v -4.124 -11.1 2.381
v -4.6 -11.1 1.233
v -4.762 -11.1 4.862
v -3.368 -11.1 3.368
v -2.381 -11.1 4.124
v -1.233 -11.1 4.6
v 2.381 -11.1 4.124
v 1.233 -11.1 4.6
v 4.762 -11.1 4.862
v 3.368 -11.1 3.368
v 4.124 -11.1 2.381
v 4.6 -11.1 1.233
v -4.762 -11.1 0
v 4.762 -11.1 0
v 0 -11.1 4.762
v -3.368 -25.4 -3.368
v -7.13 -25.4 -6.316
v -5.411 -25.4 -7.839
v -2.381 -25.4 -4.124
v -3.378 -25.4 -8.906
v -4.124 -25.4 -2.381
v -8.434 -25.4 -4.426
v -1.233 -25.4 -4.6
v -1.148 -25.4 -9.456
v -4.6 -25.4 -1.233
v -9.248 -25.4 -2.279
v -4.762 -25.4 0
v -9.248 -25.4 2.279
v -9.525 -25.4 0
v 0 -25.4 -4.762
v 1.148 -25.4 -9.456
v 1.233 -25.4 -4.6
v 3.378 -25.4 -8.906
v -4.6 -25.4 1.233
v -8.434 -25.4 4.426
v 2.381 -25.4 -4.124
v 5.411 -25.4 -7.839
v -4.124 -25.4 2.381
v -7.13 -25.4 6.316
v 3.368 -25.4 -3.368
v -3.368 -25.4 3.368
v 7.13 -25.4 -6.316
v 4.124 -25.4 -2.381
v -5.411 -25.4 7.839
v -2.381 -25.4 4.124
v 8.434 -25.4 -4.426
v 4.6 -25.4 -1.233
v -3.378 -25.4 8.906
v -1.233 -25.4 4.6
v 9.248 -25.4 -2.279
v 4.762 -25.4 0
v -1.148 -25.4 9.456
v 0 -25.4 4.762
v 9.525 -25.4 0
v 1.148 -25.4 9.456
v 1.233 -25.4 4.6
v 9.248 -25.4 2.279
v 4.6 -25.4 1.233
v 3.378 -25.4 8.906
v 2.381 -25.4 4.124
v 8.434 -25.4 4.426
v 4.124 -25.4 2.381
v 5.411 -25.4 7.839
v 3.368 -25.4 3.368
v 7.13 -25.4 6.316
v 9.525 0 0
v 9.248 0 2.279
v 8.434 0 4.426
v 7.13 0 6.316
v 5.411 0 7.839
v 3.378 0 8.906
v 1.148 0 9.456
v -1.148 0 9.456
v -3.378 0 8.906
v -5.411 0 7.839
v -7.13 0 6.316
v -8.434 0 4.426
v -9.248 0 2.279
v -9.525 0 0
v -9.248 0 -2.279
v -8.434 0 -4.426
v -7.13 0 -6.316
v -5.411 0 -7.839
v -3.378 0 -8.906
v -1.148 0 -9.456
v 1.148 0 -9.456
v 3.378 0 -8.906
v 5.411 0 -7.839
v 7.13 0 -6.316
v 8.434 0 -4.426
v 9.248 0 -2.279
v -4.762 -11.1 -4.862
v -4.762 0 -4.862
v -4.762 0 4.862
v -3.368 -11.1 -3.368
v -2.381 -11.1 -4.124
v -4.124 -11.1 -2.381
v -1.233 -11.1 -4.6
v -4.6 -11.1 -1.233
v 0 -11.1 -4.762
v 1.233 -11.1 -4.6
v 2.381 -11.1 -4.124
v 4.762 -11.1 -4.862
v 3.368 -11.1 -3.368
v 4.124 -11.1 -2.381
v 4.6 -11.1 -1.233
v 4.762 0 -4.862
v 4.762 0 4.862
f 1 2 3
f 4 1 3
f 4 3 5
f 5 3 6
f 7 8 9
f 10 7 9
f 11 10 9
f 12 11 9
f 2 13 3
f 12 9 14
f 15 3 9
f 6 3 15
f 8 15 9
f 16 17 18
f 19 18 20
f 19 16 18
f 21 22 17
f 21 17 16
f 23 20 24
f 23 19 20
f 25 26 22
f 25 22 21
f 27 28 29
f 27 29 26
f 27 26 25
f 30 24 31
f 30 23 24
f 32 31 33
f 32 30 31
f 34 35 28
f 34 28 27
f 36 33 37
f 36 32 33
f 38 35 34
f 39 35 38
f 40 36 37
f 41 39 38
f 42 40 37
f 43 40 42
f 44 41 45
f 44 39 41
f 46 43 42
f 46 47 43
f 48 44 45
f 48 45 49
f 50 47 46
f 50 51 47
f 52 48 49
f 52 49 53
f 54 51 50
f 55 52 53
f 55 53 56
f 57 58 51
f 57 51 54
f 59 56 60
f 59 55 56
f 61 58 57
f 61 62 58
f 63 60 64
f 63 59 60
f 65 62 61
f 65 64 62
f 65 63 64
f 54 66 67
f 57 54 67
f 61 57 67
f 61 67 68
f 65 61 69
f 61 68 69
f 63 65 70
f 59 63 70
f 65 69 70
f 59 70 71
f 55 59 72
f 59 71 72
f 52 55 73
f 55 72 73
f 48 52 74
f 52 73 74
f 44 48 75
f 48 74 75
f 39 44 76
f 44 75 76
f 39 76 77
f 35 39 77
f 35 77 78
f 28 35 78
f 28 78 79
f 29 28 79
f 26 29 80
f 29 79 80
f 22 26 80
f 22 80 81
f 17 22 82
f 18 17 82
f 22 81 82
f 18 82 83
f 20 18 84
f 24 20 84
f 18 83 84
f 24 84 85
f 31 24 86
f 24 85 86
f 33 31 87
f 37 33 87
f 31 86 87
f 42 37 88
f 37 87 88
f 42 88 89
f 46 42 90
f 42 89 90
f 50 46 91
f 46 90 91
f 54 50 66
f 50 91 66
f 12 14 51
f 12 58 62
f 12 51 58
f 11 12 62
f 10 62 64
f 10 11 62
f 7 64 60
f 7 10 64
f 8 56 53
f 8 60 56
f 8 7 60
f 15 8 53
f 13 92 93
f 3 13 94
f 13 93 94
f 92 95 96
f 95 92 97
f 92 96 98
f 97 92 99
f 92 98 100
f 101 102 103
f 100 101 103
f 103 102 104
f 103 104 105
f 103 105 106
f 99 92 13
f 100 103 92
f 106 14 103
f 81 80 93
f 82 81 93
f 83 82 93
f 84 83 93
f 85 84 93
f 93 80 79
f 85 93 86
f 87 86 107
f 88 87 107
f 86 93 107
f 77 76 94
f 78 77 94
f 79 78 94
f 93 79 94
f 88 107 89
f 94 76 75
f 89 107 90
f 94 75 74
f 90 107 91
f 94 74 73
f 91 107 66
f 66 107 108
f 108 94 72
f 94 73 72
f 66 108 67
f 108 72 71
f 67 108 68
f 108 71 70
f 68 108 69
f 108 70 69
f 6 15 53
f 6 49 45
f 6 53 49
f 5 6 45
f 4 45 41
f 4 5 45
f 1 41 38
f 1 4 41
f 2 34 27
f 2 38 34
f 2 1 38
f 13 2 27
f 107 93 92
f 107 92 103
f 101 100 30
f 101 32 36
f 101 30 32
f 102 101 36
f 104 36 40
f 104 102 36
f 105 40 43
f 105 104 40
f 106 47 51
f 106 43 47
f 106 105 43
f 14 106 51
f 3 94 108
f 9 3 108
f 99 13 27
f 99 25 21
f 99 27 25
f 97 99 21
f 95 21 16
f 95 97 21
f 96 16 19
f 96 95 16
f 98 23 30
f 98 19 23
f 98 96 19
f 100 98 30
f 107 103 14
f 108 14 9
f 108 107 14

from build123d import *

# Parameters (mm, degrees)
F0_R     = 9.525
F1_DEPTH = 25.4
F3_DEPTH = 25.401
F4_W     = 9.525
F4_H     = 9.723438
F5_DEPTH = 11.0998


with BuildPart() as f1:
    # F0 (on Front) → F1 (new body)
    with BuildSketch(Plane.XZ):
        Circle(F0_R)
    extrude(amount=F1_DEPTH)

    # F2 (on Front) → F3 (cut, through all)
    with BuildSketch(Plane.XZ):
        with BuildLine():
            ThreePointArc((4.7625, 0), (3.367596, 3.367596), (0, 4.7625))
            ThreePointArc((0, 4.7625), (-3.367596, 3.367596), (-4.7625, 0))
            ThreePointArc((-4.7625, 0), (-3.367596, -3.367596), (0, -4.7625))
            ThreePointArc((0, -4.7625), (3.367596, -3.367596), (4.7625, 0))
        make_face()
    extrude(amount=F3_DEPTH, mode=Mode.SUBTRACT)

    # F4 (on Front) → F5 (cut)
    with BuildSketch(Plane.XZ):
        Rectangle(F4_W, F4_H)
    extrude(amount=F5_DEPTH, mode=Mode.SUBTRACT)


solid = f1.part
